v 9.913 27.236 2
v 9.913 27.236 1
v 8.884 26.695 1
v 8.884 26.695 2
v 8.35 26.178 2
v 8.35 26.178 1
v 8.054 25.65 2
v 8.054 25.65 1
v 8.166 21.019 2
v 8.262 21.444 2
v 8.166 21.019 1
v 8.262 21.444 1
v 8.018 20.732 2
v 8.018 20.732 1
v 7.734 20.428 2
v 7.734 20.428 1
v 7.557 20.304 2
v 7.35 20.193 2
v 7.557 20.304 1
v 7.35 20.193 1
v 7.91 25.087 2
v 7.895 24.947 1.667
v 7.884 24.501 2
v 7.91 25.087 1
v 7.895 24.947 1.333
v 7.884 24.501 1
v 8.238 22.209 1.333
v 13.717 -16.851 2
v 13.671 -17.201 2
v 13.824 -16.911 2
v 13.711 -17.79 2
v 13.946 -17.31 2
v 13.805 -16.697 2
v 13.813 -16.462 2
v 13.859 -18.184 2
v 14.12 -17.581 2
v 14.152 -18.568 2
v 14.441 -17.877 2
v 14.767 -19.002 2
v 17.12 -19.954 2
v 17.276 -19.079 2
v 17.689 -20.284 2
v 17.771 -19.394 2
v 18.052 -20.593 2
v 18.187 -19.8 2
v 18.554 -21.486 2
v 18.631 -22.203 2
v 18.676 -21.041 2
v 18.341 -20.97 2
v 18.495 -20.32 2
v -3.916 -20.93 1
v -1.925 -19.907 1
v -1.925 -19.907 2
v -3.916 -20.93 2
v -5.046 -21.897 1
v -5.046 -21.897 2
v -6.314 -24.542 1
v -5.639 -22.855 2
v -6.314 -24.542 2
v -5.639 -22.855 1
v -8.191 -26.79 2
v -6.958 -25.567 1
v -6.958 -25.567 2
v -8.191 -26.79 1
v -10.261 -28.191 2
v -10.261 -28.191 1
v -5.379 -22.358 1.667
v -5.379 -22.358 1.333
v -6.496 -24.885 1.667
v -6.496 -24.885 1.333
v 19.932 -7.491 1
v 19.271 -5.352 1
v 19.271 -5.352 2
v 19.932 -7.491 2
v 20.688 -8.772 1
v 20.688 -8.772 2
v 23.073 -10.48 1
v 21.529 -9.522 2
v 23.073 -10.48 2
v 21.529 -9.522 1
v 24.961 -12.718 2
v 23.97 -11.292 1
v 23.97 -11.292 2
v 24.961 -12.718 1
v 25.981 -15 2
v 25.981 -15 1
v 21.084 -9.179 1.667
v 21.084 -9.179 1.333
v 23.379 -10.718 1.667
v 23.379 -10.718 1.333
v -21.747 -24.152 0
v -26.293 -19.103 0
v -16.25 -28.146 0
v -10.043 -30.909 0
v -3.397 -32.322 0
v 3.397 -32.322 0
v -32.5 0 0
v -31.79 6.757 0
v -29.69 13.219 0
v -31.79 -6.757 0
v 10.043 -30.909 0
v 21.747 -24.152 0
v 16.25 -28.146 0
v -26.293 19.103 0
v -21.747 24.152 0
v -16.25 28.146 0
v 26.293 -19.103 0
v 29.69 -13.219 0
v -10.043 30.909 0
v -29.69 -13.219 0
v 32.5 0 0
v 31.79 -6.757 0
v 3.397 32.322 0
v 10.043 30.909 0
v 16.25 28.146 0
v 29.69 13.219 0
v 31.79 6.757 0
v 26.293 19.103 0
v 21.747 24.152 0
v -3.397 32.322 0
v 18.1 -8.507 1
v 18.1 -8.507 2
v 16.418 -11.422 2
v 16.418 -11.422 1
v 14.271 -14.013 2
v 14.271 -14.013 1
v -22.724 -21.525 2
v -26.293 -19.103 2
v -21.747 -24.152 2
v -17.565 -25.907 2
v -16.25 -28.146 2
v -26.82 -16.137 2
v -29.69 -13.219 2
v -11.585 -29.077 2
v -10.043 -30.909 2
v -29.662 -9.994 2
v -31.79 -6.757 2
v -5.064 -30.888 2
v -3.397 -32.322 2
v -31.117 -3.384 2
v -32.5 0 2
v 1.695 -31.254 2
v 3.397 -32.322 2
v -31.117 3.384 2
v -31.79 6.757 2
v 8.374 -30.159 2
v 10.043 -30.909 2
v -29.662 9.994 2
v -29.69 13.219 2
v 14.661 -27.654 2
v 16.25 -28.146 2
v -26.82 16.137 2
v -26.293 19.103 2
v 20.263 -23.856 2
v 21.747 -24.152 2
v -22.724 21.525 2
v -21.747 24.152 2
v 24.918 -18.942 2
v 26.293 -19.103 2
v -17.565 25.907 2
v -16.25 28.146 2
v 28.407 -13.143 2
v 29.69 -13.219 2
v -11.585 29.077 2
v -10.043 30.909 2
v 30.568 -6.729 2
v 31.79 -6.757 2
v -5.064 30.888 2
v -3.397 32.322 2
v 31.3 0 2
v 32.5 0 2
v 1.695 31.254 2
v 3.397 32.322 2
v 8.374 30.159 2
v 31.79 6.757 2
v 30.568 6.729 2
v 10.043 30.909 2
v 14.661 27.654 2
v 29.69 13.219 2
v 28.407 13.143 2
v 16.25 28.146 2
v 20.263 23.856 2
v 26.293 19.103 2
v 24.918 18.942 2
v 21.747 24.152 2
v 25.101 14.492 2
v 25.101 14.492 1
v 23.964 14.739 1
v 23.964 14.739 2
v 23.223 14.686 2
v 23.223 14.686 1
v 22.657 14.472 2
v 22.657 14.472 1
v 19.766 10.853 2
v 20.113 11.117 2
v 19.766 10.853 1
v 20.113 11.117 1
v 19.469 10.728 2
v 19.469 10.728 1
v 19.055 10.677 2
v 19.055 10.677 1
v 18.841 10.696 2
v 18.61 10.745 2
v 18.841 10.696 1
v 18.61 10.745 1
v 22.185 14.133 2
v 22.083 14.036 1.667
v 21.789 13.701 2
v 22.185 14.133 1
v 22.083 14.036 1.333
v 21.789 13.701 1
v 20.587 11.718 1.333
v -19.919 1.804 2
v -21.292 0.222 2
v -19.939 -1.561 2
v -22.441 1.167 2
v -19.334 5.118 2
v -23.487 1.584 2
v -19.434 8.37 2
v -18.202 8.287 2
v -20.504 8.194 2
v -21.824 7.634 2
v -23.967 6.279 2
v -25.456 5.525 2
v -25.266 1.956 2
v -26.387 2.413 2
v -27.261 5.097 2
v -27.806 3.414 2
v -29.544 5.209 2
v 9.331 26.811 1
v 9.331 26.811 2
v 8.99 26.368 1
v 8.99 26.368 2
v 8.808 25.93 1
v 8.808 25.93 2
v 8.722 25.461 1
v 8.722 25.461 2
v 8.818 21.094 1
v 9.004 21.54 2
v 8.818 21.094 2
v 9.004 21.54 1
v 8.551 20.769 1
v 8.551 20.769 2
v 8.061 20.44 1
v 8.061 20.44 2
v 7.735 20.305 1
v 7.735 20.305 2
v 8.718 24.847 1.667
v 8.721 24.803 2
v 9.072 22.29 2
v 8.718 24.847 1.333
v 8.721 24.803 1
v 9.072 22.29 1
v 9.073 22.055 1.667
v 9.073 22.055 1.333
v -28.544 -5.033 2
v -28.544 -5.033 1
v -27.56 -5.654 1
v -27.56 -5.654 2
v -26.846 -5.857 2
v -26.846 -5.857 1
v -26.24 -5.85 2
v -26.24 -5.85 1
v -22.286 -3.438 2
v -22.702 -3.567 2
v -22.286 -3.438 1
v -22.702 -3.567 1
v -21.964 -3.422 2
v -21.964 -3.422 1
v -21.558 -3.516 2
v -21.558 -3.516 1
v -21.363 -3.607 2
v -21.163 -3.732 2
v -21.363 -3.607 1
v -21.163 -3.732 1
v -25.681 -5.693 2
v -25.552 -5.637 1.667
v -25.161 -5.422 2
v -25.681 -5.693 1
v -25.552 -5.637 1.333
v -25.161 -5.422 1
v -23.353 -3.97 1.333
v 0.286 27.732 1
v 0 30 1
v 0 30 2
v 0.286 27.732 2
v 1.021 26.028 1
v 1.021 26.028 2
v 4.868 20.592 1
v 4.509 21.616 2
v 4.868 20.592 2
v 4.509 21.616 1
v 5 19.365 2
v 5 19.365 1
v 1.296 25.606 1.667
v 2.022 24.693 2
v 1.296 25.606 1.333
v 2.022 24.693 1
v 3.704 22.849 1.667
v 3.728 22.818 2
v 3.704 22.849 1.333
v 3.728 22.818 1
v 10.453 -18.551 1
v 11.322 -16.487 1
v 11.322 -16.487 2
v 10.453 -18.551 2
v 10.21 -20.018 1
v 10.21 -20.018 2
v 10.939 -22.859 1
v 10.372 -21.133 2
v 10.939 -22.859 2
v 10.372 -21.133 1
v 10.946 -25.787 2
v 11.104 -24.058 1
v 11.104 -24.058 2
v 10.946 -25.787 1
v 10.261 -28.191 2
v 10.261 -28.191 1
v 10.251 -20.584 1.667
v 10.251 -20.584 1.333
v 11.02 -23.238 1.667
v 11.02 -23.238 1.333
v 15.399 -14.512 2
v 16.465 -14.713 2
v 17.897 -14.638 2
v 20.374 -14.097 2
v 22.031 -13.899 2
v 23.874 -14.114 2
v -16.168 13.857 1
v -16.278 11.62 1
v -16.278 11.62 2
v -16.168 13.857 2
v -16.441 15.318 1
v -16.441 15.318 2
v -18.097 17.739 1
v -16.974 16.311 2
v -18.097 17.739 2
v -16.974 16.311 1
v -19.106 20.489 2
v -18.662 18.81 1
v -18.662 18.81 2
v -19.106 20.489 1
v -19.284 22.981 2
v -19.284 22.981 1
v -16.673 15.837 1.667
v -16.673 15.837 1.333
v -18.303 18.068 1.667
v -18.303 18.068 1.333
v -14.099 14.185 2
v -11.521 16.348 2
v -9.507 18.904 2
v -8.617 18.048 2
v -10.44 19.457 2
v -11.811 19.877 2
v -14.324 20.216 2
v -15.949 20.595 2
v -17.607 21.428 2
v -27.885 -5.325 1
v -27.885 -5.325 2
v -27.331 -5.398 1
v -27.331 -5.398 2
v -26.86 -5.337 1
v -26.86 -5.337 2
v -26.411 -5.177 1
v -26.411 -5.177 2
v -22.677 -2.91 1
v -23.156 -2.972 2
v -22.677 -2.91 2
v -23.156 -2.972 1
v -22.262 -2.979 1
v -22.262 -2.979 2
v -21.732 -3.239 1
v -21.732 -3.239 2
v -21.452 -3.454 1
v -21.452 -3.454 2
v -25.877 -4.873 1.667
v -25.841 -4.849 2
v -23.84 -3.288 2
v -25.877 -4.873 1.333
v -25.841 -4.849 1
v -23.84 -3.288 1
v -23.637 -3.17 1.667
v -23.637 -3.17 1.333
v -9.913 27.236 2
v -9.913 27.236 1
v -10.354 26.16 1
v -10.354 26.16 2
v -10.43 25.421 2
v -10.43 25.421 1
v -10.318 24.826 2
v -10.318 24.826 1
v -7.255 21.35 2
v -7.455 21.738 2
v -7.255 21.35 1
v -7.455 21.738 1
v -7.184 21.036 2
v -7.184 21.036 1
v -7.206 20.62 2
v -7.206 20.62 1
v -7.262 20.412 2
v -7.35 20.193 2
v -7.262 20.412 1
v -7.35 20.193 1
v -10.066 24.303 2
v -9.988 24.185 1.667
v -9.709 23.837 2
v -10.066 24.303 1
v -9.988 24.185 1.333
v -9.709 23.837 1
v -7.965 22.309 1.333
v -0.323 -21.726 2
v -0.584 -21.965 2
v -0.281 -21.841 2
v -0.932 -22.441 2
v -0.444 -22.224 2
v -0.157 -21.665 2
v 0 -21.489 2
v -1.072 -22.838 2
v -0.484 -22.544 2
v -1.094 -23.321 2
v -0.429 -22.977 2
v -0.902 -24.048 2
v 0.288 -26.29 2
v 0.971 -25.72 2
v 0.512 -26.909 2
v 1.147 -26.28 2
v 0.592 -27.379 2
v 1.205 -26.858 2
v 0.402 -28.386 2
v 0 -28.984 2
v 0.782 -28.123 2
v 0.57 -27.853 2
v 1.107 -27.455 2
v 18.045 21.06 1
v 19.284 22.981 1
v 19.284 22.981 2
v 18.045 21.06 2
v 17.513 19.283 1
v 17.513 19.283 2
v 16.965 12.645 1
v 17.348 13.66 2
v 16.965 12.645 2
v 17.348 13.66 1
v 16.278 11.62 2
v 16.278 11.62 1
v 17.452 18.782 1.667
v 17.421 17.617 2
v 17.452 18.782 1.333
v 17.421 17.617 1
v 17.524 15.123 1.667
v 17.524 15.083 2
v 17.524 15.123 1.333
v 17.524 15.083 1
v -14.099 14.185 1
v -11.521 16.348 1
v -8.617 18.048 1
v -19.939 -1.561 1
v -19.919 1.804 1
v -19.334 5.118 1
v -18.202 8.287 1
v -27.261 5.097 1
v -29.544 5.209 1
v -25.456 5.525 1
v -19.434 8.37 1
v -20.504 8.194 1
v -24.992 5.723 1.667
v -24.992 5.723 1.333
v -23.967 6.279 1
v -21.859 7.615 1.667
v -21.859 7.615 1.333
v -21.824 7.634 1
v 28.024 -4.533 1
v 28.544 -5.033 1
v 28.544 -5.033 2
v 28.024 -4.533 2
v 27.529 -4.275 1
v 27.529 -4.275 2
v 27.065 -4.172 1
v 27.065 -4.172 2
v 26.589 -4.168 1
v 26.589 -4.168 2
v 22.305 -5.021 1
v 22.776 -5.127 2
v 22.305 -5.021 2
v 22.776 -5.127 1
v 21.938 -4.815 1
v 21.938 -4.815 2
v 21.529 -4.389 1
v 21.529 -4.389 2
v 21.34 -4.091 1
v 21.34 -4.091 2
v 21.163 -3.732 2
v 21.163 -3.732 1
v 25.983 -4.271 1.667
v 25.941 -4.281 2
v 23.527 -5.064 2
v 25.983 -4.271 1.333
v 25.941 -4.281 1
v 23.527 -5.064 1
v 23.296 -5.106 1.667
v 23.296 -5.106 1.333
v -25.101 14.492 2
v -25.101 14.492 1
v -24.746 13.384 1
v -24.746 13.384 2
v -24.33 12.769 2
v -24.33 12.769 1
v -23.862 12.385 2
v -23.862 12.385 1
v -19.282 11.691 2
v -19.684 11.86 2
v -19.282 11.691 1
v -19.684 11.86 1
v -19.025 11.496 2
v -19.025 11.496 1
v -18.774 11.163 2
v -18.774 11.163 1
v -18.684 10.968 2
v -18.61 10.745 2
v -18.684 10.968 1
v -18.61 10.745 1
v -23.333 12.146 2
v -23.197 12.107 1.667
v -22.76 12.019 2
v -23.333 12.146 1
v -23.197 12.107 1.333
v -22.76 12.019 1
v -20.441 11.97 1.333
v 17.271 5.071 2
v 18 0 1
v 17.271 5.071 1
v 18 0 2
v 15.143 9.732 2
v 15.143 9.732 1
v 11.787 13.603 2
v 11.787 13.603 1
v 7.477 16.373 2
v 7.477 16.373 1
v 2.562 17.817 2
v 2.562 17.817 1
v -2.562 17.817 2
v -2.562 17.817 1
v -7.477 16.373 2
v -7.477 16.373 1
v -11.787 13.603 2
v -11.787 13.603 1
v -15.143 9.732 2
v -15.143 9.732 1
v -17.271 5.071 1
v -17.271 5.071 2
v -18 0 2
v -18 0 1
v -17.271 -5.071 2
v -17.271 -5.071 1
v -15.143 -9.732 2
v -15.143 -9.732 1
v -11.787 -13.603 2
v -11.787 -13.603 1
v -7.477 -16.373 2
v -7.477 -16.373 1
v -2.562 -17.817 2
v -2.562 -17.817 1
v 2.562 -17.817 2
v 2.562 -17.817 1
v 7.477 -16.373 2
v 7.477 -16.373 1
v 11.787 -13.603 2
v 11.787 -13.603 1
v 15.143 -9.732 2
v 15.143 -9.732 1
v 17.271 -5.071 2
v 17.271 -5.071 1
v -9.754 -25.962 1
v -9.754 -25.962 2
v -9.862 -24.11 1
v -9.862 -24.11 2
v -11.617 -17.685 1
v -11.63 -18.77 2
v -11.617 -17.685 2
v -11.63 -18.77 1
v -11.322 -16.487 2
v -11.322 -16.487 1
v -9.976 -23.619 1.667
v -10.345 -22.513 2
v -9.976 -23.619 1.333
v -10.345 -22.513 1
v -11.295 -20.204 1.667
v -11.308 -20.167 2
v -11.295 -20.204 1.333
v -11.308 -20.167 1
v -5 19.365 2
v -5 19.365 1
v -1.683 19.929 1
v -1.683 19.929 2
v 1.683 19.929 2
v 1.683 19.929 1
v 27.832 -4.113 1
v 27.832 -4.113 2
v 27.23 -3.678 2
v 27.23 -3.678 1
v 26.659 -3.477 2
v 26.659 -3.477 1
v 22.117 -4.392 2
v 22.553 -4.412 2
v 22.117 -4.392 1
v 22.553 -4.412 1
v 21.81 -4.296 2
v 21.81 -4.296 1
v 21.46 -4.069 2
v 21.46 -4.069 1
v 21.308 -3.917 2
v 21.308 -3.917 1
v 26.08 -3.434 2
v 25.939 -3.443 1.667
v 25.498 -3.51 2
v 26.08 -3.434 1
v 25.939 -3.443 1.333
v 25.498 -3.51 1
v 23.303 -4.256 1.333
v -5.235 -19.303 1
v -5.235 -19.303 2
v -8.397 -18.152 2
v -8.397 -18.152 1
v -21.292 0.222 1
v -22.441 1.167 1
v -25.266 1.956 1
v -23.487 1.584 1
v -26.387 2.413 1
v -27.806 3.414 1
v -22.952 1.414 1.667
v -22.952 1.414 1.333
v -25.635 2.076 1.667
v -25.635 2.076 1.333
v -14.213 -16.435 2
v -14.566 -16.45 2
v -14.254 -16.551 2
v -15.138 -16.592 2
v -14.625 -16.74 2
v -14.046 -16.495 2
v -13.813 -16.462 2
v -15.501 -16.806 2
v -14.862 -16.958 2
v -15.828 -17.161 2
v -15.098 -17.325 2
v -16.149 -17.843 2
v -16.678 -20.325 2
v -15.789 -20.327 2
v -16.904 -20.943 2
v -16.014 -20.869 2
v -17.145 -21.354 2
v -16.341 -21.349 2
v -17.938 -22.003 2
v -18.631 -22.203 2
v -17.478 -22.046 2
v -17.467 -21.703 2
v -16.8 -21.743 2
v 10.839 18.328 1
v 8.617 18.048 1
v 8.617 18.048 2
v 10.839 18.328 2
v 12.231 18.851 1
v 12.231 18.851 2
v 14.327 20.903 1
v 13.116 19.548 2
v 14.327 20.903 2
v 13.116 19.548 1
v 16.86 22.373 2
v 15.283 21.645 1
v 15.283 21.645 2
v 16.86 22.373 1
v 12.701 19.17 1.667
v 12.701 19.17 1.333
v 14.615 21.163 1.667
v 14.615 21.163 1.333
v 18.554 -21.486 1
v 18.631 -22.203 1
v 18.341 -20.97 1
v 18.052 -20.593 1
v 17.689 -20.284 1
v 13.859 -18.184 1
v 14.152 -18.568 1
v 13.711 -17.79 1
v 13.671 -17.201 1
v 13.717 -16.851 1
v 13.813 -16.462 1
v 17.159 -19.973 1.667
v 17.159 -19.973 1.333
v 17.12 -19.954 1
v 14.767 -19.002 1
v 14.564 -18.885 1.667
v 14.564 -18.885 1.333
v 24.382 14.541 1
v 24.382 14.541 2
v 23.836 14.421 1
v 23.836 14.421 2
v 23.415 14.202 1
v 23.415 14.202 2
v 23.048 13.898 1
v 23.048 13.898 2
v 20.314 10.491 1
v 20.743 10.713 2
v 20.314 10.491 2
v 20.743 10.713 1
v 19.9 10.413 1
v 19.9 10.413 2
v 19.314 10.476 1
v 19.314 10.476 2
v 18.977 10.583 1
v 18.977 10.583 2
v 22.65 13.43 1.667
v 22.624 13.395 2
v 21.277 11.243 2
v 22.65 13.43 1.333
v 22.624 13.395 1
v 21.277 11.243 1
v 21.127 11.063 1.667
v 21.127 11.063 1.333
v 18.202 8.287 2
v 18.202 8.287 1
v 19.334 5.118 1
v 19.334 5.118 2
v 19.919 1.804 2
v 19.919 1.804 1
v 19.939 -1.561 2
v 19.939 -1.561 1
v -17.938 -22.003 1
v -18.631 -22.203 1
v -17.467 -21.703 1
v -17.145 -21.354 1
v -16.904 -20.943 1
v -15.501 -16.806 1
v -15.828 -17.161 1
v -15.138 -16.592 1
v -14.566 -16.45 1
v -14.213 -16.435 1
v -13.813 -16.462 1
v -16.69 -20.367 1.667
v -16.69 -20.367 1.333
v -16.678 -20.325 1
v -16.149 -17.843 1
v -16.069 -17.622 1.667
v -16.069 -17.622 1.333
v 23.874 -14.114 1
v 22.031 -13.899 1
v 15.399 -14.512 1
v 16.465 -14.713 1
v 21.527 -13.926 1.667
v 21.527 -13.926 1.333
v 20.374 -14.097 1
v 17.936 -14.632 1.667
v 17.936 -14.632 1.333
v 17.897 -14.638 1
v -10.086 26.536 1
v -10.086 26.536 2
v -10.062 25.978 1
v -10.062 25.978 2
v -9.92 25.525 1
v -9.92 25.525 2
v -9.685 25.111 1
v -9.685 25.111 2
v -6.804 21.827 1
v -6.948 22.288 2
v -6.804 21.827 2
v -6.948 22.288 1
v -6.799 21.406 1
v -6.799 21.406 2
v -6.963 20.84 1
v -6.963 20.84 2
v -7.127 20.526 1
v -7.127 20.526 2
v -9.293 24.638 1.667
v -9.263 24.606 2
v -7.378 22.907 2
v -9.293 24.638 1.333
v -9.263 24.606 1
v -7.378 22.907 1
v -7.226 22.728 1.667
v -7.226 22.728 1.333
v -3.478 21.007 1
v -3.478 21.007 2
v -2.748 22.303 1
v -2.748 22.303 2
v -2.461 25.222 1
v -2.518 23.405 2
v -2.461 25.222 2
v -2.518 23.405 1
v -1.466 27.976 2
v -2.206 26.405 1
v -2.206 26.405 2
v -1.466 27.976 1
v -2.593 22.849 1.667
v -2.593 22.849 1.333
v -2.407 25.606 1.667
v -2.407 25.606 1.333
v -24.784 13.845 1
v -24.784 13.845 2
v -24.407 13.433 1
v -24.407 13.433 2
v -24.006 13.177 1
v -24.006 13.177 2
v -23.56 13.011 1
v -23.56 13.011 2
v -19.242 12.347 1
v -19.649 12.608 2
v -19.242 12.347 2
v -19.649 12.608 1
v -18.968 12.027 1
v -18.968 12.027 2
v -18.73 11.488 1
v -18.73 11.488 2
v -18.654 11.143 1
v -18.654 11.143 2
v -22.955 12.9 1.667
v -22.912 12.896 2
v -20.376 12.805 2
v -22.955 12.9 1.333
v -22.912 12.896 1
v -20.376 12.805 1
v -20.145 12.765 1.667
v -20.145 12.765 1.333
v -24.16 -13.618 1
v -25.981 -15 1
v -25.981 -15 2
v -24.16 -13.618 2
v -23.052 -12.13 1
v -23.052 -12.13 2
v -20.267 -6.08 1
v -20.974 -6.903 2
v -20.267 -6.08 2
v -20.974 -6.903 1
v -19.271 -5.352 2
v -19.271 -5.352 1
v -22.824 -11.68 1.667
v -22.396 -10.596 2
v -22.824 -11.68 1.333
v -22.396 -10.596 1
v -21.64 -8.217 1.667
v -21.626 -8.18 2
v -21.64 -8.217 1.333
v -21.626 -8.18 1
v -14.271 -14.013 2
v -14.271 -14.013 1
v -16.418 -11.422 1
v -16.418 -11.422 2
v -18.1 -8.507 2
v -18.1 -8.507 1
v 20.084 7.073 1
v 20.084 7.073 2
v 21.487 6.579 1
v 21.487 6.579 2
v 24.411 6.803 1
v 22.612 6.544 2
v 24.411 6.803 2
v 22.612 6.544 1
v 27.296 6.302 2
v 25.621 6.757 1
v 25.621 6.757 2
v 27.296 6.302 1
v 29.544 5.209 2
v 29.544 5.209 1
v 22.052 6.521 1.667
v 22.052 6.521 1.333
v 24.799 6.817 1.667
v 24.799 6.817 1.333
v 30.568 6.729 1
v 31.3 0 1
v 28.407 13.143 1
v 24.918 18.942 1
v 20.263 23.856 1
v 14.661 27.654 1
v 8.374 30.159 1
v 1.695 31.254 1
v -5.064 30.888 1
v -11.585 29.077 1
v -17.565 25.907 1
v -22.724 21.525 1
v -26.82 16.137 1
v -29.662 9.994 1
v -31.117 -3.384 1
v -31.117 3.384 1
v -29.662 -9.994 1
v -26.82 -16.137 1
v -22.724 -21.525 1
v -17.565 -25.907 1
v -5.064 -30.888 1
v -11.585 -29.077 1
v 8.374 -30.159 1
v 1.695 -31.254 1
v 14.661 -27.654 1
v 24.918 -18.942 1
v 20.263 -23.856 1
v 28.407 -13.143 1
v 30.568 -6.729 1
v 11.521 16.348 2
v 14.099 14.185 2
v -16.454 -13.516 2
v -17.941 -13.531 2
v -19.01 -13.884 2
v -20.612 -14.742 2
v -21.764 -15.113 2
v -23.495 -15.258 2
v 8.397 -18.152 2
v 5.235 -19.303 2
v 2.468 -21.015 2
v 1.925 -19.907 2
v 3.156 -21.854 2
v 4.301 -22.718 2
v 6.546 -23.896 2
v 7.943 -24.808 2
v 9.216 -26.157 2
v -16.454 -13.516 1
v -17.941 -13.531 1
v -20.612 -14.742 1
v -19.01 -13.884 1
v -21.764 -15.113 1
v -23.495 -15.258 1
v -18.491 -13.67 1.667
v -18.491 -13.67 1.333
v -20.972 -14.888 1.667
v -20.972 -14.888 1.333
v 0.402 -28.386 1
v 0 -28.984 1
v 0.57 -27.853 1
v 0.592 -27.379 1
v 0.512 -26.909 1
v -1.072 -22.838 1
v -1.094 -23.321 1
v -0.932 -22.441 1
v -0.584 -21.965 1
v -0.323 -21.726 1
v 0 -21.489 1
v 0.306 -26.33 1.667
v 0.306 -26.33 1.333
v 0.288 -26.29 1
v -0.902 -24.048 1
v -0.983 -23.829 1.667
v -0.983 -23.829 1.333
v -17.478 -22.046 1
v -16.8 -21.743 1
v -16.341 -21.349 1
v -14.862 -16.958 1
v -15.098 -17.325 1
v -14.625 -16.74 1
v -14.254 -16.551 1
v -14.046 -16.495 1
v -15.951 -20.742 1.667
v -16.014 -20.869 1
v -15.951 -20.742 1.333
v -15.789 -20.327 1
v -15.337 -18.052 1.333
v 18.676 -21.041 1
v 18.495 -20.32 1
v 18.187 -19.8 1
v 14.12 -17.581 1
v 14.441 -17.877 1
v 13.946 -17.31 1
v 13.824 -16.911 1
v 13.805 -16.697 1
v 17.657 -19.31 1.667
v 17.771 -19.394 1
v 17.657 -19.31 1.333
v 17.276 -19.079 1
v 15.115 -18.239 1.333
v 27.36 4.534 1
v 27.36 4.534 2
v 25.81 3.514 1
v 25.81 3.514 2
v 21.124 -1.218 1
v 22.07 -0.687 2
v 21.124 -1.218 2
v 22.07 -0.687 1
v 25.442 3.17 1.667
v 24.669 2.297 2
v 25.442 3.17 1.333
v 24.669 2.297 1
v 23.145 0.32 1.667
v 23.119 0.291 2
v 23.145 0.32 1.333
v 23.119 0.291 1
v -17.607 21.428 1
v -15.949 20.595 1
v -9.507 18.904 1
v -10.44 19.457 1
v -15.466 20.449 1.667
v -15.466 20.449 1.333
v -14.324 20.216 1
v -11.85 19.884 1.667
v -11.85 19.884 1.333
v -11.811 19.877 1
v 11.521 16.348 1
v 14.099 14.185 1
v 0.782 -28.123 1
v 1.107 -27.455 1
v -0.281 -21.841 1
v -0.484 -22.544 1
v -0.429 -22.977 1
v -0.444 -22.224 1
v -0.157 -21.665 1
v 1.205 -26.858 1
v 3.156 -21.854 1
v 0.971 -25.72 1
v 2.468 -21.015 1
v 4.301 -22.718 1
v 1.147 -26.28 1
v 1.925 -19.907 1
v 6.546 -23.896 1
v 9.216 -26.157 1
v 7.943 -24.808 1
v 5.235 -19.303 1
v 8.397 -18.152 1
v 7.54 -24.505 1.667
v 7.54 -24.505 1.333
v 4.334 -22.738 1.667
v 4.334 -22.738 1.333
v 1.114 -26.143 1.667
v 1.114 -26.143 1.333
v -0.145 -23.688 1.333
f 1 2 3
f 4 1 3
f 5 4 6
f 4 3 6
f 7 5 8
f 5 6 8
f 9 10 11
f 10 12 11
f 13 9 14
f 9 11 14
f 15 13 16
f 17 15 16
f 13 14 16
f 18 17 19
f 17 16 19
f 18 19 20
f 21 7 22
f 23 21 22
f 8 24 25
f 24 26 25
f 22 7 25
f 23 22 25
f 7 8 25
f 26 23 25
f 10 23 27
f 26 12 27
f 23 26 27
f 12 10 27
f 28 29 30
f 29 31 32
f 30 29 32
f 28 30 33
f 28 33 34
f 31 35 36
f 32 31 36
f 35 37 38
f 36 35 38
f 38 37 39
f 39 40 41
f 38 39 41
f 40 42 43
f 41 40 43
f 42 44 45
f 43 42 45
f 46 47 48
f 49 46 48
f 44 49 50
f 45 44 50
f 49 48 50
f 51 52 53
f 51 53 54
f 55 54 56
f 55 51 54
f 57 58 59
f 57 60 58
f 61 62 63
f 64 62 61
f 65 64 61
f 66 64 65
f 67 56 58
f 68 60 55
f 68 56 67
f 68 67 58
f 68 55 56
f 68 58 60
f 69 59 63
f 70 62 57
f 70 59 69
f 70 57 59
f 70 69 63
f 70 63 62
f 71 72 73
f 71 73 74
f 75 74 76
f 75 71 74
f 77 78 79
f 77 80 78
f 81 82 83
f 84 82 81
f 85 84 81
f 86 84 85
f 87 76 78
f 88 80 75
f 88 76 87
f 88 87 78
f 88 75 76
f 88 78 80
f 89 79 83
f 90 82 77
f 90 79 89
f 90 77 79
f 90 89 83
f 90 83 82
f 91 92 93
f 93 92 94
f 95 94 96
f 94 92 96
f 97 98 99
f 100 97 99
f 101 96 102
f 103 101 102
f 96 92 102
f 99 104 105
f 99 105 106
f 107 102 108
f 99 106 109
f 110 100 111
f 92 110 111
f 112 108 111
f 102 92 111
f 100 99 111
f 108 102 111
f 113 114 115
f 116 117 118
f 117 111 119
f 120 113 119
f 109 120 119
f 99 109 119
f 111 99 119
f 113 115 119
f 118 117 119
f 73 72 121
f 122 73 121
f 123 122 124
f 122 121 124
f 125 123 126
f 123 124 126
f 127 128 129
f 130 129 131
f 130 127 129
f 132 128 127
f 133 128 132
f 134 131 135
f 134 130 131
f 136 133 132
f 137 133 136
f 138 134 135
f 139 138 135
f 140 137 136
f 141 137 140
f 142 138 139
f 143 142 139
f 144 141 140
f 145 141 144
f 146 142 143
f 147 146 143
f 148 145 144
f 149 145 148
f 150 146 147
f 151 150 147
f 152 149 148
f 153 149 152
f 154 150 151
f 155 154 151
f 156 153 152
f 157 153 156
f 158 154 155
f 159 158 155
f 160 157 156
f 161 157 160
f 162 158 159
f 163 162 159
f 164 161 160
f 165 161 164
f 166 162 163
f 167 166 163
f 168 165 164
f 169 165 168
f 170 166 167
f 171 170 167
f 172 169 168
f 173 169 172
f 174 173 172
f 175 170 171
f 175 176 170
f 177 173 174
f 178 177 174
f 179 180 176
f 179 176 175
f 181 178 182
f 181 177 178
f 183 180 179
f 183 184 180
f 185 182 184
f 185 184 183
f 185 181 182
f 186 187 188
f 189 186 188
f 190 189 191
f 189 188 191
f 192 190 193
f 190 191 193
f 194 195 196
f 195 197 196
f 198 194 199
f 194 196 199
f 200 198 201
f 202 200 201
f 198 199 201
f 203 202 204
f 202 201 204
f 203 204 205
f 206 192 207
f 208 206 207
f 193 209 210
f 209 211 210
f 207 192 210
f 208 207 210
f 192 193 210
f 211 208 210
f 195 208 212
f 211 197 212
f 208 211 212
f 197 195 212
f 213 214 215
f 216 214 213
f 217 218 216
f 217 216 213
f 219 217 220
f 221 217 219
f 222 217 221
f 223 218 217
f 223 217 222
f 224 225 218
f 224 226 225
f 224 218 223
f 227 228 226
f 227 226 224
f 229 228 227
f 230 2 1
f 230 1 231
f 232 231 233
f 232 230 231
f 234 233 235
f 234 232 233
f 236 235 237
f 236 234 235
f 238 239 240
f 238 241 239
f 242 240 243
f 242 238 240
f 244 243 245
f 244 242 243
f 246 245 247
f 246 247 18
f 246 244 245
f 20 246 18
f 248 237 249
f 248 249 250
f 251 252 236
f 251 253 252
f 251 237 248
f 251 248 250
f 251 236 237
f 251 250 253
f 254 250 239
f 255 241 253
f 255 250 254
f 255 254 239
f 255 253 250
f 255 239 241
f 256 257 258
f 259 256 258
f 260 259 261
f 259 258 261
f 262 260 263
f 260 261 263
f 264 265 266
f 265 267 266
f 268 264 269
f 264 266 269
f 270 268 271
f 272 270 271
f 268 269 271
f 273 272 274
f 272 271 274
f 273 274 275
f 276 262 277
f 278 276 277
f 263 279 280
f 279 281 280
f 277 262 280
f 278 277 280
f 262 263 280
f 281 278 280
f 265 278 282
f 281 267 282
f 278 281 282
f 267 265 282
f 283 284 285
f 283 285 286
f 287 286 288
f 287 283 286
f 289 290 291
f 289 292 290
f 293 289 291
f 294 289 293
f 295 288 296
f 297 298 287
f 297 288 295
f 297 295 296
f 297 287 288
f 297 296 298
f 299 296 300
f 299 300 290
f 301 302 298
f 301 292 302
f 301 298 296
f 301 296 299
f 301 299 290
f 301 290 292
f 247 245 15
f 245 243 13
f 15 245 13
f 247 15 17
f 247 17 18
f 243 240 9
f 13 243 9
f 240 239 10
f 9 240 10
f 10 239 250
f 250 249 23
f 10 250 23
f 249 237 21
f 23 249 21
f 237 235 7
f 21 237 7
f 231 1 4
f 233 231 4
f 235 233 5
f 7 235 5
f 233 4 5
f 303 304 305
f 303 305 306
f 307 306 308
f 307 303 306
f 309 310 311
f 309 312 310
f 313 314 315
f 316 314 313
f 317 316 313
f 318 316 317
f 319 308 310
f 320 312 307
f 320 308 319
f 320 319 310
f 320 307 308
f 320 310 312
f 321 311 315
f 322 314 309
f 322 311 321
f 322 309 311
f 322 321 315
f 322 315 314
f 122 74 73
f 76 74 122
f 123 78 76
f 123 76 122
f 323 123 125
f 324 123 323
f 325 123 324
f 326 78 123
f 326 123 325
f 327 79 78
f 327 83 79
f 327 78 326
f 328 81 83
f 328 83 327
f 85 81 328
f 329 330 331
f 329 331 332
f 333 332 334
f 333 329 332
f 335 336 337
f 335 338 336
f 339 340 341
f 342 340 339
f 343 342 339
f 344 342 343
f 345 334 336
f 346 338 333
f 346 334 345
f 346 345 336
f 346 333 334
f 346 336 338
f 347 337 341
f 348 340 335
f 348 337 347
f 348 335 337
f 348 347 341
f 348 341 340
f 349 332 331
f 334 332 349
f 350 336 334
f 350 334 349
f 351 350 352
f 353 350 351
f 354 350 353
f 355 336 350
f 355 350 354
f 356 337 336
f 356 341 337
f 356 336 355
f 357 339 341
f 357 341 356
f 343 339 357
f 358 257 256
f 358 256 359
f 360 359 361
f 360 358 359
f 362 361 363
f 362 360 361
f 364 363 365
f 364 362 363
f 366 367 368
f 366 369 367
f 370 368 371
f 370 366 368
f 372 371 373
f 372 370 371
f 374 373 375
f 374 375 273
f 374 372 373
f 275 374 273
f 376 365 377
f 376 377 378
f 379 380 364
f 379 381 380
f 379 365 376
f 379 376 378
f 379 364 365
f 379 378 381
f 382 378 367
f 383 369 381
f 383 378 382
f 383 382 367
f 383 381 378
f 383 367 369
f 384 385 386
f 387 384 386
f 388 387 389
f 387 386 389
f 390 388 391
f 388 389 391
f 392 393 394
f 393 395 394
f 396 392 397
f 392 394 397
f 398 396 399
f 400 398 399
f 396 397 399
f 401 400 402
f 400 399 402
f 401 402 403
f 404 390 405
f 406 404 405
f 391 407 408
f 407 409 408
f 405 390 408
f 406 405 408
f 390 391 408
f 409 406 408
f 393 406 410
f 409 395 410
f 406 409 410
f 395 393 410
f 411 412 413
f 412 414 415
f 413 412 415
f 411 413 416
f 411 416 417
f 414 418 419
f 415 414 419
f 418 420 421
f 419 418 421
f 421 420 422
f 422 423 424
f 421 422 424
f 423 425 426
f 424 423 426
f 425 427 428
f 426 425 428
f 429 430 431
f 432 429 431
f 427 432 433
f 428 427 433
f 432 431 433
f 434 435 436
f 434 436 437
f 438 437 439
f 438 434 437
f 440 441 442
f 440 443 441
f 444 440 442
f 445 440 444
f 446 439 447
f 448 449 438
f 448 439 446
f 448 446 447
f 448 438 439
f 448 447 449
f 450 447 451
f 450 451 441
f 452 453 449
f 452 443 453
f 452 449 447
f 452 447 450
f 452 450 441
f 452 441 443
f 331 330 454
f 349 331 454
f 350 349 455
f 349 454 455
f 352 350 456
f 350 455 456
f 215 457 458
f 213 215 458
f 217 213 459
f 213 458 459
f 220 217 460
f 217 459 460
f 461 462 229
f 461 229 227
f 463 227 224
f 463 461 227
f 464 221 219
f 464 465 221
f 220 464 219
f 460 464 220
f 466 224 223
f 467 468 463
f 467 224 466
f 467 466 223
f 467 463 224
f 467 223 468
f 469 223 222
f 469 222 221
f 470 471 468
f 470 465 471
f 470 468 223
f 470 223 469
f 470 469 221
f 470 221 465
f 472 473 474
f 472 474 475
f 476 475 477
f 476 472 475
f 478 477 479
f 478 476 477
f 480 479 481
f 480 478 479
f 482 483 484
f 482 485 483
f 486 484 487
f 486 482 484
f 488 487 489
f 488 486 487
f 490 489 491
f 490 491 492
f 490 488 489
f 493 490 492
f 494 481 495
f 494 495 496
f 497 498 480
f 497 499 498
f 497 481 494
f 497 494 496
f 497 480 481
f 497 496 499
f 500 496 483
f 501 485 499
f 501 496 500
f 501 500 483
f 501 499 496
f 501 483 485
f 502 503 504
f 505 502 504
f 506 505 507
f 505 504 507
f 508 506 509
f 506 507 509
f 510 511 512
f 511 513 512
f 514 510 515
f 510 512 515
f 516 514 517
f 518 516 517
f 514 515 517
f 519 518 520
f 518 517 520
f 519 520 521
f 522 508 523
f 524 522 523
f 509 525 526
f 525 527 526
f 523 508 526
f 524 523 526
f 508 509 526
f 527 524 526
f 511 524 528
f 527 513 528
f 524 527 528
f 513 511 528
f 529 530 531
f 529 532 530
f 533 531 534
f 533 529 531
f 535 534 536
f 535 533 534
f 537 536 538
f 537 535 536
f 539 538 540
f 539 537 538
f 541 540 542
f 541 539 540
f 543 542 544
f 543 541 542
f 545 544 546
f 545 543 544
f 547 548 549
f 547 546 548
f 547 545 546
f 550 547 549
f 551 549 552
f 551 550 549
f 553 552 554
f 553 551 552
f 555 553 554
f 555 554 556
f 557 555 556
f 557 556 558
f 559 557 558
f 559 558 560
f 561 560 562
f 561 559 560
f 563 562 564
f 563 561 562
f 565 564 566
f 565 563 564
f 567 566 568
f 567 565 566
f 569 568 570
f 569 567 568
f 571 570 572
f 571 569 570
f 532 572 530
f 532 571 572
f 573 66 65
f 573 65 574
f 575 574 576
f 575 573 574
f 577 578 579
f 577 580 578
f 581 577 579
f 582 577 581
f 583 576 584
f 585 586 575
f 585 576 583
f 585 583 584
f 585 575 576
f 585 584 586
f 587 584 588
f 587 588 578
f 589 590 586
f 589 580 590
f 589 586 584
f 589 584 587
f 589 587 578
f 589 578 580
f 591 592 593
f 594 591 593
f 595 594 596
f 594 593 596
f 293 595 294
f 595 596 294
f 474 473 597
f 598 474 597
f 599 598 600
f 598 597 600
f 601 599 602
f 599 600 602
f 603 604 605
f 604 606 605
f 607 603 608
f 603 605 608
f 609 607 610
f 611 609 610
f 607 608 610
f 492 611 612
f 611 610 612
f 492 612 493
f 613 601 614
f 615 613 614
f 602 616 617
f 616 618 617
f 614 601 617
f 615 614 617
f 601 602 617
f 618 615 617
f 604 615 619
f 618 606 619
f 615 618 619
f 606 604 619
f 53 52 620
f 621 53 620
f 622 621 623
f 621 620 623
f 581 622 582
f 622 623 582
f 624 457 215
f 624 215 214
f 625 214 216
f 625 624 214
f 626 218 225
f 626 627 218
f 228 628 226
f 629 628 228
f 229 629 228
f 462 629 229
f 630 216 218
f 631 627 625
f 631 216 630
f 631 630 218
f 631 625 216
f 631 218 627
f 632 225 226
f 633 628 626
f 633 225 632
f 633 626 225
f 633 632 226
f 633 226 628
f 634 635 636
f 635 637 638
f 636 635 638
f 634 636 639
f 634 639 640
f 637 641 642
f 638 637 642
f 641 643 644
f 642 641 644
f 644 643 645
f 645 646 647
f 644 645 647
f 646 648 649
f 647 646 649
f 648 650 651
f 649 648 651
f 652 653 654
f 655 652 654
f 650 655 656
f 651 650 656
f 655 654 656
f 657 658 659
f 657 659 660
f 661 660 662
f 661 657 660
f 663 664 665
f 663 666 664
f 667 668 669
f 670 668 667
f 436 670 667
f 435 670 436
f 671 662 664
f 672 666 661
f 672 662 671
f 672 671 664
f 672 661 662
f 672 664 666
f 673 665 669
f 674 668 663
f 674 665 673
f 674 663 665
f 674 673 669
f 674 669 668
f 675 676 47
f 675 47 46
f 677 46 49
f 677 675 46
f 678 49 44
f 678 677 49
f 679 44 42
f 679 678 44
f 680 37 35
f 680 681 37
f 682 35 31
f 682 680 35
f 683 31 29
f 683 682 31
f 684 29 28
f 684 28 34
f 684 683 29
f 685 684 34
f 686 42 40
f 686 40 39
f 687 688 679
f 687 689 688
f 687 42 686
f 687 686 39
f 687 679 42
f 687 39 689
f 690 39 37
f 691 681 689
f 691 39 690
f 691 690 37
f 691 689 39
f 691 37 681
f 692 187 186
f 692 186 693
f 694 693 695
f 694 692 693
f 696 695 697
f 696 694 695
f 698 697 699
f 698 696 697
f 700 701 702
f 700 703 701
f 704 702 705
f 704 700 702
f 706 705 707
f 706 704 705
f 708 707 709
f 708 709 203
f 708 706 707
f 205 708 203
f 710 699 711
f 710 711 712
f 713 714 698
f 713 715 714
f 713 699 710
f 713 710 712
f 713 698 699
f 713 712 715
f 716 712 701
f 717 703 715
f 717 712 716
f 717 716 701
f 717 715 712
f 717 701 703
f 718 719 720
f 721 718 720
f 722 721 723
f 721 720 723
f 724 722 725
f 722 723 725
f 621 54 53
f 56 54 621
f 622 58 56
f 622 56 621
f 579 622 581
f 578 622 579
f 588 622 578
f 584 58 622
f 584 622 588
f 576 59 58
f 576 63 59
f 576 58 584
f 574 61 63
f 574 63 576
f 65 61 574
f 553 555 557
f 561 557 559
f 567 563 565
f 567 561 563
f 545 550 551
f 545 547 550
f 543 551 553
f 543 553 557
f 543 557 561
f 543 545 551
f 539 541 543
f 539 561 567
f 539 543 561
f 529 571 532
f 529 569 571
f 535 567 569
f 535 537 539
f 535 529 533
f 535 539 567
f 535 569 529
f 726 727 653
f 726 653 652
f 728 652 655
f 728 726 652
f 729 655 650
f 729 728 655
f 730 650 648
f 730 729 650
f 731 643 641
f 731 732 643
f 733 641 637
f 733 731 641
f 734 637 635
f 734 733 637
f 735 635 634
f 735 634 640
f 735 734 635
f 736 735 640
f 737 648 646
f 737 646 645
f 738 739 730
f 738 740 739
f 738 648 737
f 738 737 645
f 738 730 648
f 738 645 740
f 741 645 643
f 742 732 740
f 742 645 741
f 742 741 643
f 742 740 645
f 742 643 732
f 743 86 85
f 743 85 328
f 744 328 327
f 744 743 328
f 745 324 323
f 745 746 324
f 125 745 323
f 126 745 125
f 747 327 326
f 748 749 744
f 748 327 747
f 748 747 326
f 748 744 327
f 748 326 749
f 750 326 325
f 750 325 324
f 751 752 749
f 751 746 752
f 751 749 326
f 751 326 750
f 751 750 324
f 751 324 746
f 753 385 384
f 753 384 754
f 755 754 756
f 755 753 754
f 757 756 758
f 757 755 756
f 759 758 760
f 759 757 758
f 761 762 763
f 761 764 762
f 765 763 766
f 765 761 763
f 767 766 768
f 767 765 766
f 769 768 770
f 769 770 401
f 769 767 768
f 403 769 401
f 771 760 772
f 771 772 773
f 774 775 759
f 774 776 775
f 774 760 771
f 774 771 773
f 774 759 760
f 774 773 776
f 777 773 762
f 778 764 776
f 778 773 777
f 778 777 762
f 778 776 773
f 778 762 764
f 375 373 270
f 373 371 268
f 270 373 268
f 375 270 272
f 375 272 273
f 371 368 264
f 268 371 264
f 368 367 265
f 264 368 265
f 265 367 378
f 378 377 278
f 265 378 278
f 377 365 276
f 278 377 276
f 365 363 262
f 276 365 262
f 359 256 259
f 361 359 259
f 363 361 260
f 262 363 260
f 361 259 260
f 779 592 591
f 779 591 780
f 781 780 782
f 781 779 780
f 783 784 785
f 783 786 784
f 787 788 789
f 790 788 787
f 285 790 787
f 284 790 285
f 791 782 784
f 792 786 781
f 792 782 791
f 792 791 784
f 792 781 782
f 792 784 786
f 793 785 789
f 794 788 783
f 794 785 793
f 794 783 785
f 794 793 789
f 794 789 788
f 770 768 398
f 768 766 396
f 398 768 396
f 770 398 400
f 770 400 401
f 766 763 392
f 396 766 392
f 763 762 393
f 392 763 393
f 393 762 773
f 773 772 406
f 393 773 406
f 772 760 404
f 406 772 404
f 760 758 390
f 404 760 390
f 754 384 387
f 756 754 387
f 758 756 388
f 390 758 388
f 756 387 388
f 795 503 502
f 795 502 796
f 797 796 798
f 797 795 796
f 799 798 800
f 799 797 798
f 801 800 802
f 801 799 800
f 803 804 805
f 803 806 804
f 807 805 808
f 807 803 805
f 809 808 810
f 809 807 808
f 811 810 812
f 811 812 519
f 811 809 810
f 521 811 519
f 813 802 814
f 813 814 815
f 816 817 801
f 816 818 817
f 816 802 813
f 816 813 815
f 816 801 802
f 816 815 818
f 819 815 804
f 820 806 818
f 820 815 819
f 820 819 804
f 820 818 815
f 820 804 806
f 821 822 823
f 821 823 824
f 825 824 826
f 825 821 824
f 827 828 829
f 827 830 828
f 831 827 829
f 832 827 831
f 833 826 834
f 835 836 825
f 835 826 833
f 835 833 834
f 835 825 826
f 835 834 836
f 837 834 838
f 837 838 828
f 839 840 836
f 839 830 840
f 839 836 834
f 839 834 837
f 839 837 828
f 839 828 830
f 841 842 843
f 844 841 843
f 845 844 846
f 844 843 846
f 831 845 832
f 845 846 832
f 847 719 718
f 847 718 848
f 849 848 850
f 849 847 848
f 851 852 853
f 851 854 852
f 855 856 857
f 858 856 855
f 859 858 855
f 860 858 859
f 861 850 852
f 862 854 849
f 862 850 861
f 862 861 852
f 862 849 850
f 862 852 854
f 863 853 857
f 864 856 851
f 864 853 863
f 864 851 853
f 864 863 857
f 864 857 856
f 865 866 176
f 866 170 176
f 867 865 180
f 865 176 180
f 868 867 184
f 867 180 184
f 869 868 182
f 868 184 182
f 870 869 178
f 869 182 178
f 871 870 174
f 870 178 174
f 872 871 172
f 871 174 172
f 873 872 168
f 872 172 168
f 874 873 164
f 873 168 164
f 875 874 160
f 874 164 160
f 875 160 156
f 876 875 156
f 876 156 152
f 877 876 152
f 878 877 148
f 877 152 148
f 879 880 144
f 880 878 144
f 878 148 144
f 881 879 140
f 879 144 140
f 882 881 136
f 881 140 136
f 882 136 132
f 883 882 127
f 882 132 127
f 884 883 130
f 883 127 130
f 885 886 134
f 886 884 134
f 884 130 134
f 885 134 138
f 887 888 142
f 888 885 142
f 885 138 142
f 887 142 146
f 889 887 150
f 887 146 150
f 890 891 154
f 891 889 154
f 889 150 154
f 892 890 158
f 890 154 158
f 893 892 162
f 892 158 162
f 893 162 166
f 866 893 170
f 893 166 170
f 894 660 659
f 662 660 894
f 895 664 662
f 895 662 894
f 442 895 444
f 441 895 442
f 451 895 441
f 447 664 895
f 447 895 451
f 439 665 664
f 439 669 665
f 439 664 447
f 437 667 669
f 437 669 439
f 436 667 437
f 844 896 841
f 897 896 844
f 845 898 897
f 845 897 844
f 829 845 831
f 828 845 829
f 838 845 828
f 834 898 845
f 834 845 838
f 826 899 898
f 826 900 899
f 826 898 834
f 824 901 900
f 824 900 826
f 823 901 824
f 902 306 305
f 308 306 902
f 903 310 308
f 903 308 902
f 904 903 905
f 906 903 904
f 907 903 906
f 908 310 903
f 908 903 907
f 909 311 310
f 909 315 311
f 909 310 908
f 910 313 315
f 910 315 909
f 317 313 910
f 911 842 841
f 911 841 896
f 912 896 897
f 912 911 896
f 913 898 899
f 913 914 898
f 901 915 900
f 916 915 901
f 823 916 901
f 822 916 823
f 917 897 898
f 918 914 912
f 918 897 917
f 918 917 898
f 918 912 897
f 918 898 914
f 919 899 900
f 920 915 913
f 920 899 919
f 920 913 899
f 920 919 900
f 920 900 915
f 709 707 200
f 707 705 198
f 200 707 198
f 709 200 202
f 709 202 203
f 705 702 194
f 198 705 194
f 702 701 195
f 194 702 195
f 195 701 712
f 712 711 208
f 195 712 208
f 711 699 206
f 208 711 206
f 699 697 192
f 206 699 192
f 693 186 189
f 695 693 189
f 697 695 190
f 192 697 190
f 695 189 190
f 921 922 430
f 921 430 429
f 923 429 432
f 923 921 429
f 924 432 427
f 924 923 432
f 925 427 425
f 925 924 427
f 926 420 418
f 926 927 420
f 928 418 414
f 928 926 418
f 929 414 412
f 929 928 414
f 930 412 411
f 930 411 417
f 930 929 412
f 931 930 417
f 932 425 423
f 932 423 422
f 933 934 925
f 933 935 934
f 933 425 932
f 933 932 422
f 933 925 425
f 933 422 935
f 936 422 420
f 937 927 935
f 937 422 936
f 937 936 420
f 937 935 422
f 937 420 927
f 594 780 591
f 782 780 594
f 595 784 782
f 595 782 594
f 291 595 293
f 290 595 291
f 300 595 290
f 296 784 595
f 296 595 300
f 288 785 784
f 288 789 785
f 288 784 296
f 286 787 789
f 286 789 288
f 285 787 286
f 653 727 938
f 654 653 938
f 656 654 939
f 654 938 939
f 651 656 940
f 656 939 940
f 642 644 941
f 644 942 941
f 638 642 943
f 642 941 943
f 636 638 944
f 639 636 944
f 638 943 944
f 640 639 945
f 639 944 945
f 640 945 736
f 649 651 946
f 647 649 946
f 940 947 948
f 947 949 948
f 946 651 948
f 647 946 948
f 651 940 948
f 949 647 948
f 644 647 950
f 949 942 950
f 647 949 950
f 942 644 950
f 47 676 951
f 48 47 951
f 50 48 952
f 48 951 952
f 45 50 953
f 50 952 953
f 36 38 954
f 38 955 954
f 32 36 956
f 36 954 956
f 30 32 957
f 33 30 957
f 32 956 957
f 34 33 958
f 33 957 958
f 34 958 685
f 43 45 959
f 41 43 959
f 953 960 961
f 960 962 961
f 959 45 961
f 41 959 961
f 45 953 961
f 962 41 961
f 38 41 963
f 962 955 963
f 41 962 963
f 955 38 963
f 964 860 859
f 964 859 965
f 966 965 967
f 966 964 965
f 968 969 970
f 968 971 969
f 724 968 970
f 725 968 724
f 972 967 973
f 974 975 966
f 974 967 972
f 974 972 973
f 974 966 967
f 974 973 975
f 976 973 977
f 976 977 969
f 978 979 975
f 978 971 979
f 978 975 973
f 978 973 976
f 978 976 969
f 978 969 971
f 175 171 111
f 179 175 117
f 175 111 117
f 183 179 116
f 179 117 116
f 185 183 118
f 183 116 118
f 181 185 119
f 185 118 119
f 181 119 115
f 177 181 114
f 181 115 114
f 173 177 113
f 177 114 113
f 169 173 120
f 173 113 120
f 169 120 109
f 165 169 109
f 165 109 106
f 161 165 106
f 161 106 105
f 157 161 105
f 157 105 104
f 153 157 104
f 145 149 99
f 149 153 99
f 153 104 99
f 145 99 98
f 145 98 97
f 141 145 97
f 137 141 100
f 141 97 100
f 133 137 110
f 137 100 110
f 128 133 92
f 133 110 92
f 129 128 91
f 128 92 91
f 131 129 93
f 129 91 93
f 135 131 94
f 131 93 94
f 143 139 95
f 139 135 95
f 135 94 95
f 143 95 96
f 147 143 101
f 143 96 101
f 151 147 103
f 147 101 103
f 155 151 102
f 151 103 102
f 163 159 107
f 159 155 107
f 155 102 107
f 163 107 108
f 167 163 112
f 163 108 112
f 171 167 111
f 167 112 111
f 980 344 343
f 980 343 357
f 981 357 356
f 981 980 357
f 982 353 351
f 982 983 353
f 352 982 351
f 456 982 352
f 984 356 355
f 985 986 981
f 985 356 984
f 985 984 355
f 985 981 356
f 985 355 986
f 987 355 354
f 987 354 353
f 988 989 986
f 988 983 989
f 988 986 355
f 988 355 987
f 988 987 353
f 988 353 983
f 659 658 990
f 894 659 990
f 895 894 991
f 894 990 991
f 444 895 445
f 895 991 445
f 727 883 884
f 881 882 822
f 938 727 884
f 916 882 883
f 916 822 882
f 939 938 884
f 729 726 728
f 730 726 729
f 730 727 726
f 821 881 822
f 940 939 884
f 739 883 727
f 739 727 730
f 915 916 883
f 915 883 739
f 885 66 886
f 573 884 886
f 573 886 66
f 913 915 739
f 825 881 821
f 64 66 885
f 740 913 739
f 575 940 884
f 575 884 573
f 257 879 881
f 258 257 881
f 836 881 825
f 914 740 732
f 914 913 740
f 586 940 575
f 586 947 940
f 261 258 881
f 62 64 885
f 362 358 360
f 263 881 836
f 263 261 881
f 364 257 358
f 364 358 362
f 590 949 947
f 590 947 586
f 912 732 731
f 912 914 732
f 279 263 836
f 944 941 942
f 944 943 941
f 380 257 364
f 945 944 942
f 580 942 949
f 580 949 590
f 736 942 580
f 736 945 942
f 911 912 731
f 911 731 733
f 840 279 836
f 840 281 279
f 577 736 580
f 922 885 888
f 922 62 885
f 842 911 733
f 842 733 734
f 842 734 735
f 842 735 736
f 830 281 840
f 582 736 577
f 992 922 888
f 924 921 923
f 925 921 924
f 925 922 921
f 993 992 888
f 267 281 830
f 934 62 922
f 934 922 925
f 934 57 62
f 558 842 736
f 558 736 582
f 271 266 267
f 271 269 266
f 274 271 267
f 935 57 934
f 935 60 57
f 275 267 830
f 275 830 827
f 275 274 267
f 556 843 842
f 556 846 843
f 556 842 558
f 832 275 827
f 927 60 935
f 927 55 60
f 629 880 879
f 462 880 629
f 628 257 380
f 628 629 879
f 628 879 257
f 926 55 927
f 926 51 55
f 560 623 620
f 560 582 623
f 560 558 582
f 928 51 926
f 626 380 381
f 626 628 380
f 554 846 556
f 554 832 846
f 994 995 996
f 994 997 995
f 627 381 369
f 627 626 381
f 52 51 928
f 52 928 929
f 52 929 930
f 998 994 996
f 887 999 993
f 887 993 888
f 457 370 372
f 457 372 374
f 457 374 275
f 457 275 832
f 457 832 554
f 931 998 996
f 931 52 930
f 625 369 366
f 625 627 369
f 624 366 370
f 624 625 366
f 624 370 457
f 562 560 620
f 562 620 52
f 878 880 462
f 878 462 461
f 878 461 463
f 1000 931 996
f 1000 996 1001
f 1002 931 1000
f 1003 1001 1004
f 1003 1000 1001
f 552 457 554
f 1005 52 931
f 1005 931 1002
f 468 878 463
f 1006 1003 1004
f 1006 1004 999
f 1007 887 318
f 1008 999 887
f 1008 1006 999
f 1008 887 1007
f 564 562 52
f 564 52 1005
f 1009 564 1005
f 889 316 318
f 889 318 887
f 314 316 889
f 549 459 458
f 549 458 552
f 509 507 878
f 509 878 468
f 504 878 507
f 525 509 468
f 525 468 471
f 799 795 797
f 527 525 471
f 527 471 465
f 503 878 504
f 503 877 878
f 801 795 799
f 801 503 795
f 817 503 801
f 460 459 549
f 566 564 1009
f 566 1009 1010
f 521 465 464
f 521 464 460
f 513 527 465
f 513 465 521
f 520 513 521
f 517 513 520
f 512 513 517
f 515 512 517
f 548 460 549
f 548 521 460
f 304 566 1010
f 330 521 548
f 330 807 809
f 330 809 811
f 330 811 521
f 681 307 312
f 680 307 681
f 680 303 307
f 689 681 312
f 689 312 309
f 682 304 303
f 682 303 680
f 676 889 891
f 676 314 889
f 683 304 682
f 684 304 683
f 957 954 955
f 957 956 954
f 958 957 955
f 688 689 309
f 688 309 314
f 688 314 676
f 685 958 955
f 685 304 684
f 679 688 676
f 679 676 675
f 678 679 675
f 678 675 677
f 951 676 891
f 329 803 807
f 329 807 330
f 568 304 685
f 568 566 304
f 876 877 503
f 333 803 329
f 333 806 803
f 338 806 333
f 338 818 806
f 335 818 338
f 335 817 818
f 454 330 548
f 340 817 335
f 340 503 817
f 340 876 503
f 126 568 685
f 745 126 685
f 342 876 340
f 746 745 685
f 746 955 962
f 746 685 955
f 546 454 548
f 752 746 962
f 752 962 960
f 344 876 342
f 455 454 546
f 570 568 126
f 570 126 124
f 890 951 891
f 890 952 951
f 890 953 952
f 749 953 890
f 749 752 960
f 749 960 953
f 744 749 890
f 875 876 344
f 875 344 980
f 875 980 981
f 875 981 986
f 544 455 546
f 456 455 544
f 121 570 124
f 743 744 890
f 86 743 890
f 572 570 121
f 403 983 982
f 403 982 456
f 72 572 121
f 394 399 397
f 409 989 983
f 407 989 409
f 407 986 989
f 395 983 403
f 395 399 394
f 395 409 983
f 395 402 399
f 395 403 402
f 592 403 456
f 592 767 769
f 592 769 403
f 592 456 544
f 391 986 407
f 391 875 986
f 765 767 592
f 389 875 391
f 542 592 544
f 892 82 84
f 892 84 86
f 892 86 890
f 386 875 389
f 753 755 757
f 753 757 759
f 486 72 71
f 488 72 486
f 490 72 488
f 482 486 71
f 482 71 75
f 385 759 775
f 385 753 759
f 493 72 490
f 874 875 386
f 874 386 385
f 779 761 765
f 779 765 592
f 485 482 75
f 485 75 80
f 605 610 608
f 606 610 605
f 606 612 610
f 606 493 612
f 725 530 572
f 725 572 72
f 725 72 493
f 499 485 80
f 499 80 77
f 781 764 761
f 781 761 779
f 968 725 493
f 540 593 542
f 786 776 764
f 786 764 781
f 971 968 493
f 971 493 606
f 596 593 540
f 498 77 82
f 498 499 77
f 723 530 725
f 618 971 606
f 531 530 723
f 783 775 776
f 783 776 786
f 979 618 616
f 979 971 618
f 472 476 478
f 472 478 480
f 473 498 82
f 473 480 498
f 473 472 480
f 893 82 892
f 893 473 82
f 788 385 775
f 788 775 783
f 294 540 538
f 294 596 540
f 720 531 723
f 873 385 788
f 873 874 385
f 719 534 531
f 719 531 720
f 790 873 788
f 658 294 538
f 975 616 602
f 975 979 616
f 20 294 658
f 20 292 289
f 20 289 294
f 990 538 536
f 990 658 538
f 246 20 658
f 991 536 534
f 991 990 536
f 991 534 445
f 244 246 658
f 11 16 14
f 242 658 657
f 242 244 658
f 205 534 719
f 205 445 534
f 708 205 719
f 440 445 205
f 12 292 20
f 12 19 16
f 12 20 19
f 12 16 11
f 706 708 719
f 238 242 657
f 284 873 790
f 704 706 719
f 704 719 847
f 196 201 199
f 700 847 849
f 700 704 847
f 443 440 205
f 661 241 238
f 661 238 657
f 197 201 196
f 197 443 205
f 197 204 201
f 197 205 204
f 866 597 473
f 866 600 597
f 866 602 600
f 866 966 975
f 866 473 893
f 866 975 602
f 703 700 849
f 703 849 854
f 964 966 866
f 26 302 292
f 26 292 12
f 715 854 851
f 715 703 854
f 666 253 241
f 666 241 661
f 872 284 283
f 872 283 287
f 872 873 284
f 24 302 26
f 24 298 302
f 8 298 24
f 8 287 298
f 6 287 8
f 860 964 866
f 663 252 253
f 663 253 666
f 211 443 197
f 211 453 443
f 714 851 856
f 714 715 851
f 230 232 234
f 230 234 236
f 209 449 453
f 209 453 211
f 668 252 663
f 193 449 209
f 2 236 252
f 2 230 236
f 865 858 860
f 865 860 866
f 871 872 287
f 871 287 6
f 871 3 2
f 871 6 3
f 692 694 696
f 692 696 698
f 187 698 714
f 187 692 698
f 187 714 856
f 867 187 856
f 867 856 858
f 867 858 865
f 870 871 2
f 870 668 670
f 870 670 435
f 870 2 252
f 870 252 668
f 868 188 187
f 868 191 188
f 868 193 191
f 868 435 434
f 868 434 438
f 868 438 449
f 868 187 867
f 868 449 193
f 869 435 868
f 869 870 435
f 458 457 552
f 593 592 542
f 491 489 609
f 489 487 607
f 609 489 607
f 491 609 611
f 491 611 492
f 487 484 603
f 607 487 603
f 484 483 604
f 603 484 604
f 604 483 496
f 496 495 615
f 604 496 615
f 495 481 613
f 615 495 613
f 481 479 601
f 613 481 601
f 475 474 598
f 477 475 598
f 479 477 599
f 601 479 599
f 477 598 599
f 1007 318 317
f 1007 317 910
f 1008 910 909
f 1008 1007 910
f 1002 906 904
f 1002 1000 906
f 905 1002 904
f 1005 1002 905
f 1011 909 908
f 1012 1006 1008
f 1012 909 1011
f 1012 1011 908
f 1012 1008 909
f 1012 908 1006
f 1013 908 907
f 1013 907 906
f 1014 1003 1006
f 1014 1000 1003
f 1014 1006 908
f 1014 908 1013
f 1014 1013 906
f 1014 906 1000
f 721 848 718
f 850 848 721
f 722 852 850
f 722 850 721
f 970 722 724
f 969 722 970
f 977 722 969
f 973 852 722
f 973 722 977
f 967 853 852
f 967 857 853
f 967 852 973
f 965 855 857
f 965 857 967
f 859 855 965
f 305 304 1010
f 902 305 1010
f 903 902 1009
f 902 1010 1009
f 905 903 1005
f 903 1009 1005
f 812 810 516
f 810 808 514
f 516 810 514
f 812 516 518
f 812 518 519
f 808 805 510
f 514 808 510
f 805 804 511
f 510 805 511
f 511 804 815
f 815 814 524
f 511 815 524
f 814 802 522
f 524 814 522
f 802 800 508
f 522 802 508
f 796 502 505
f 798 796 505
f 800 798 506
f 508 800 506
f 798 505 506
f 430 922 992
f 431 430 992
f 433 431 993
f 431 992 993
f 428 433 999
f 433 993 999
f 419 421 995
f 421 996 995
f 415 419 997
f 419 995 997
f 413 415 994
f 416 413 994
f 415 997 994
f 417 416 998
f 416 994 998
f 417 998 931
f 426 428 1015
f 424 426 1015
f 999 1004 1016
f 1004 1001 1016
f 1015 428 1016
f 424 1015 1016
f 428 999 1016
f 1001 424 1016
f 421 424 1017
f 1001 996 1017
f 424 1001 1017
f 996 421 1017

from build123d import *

# Parameters (mm, degrees)
F0_R     = 32.5
F1_DEPTH = 2
F2_R     = 31.3
F2_R_2   = 18
F3_DEPTH = 1
F5_DEPTH = 1
F6_COUNT = 9


with BuildPart() as f1:
    # F0 (on Top) → F1 (new body)
    with BuildSketch(Plane.XY):
        Circle(F0_R)
    extrude(amount=F1_DEPTH)

    # F2 (on face) → F3 (cut)
    with BuildSketch(Plane.XY.offset(2)):
        Circle(F2_R)
        Circle(F2_R_2, mode=Mode.SUBTRACT)
    extrude(amount=-F3_DEPTH, mode=Mode.SUBTRACT)

    # F4 (on face) → F5 (join, through all)
    with BuildSketch(Plane.XY.offset(1)):
        with BuildLine():
            ThreePointArc((-5, 19.364916731), (0, 20), (5, 19.364916731))
            add(Edge.make_bspline(
                [(0, 30), (0, 24), (5, 24), (5, 19.364916731)],
                knots=[0, 0, 0, 0, 11.7518082072, 11.7518082072, 11.7518082072, 11.7518082072], degree=3))
            add(Edge.make_bspline(
                [(-5, 19.364916731), (0, 24), (-5, 24), (0, 30)],
                knots=[0, 0, 0, 0, 11.7518082072, 11.7518082072, 11.7518082072, 11.7518082072], degree=3))
        make_face()
        with BuildLine():
            add(Edge.make_bspline(
                [(9.9131672787, 27.2362032534), (6.7328927107, 25.4915188998), (11.3224480301, 21.147036925), (7.3497492192, 20.1932700184)],
                knots=[0, 0, 0, 0, 7.4949330017, 7.4949330017, 7.4949330017, 7.4949330017], degree=3))
            add(Edge.make_bspline(
                [(9.9131672787, 27.2362032534), (5.5151497945, 25.5608577281), (10.0525226444, 21.4589480311), (7.3497492192, 20.1932700184)],
                knots=[0, 0, 0, 0, 7.4949330017, 7.4949330017, 7.4949330017, 7.4949330017], degree=3))
        make_face()
    extrude(amount=F5_DEPTH)

    # F6: F1 ×9 about axis
    f6_axis = Axis((0, 0, 0), (0, 0, -1))


with BuildPart() as f1_1:
    add(f1.part)
    for i in range(1, F6_COUNT):
        add(f1.part.rotate(f6_axis, i * 360 / F6_COUNT))


solid = f1_1.part
